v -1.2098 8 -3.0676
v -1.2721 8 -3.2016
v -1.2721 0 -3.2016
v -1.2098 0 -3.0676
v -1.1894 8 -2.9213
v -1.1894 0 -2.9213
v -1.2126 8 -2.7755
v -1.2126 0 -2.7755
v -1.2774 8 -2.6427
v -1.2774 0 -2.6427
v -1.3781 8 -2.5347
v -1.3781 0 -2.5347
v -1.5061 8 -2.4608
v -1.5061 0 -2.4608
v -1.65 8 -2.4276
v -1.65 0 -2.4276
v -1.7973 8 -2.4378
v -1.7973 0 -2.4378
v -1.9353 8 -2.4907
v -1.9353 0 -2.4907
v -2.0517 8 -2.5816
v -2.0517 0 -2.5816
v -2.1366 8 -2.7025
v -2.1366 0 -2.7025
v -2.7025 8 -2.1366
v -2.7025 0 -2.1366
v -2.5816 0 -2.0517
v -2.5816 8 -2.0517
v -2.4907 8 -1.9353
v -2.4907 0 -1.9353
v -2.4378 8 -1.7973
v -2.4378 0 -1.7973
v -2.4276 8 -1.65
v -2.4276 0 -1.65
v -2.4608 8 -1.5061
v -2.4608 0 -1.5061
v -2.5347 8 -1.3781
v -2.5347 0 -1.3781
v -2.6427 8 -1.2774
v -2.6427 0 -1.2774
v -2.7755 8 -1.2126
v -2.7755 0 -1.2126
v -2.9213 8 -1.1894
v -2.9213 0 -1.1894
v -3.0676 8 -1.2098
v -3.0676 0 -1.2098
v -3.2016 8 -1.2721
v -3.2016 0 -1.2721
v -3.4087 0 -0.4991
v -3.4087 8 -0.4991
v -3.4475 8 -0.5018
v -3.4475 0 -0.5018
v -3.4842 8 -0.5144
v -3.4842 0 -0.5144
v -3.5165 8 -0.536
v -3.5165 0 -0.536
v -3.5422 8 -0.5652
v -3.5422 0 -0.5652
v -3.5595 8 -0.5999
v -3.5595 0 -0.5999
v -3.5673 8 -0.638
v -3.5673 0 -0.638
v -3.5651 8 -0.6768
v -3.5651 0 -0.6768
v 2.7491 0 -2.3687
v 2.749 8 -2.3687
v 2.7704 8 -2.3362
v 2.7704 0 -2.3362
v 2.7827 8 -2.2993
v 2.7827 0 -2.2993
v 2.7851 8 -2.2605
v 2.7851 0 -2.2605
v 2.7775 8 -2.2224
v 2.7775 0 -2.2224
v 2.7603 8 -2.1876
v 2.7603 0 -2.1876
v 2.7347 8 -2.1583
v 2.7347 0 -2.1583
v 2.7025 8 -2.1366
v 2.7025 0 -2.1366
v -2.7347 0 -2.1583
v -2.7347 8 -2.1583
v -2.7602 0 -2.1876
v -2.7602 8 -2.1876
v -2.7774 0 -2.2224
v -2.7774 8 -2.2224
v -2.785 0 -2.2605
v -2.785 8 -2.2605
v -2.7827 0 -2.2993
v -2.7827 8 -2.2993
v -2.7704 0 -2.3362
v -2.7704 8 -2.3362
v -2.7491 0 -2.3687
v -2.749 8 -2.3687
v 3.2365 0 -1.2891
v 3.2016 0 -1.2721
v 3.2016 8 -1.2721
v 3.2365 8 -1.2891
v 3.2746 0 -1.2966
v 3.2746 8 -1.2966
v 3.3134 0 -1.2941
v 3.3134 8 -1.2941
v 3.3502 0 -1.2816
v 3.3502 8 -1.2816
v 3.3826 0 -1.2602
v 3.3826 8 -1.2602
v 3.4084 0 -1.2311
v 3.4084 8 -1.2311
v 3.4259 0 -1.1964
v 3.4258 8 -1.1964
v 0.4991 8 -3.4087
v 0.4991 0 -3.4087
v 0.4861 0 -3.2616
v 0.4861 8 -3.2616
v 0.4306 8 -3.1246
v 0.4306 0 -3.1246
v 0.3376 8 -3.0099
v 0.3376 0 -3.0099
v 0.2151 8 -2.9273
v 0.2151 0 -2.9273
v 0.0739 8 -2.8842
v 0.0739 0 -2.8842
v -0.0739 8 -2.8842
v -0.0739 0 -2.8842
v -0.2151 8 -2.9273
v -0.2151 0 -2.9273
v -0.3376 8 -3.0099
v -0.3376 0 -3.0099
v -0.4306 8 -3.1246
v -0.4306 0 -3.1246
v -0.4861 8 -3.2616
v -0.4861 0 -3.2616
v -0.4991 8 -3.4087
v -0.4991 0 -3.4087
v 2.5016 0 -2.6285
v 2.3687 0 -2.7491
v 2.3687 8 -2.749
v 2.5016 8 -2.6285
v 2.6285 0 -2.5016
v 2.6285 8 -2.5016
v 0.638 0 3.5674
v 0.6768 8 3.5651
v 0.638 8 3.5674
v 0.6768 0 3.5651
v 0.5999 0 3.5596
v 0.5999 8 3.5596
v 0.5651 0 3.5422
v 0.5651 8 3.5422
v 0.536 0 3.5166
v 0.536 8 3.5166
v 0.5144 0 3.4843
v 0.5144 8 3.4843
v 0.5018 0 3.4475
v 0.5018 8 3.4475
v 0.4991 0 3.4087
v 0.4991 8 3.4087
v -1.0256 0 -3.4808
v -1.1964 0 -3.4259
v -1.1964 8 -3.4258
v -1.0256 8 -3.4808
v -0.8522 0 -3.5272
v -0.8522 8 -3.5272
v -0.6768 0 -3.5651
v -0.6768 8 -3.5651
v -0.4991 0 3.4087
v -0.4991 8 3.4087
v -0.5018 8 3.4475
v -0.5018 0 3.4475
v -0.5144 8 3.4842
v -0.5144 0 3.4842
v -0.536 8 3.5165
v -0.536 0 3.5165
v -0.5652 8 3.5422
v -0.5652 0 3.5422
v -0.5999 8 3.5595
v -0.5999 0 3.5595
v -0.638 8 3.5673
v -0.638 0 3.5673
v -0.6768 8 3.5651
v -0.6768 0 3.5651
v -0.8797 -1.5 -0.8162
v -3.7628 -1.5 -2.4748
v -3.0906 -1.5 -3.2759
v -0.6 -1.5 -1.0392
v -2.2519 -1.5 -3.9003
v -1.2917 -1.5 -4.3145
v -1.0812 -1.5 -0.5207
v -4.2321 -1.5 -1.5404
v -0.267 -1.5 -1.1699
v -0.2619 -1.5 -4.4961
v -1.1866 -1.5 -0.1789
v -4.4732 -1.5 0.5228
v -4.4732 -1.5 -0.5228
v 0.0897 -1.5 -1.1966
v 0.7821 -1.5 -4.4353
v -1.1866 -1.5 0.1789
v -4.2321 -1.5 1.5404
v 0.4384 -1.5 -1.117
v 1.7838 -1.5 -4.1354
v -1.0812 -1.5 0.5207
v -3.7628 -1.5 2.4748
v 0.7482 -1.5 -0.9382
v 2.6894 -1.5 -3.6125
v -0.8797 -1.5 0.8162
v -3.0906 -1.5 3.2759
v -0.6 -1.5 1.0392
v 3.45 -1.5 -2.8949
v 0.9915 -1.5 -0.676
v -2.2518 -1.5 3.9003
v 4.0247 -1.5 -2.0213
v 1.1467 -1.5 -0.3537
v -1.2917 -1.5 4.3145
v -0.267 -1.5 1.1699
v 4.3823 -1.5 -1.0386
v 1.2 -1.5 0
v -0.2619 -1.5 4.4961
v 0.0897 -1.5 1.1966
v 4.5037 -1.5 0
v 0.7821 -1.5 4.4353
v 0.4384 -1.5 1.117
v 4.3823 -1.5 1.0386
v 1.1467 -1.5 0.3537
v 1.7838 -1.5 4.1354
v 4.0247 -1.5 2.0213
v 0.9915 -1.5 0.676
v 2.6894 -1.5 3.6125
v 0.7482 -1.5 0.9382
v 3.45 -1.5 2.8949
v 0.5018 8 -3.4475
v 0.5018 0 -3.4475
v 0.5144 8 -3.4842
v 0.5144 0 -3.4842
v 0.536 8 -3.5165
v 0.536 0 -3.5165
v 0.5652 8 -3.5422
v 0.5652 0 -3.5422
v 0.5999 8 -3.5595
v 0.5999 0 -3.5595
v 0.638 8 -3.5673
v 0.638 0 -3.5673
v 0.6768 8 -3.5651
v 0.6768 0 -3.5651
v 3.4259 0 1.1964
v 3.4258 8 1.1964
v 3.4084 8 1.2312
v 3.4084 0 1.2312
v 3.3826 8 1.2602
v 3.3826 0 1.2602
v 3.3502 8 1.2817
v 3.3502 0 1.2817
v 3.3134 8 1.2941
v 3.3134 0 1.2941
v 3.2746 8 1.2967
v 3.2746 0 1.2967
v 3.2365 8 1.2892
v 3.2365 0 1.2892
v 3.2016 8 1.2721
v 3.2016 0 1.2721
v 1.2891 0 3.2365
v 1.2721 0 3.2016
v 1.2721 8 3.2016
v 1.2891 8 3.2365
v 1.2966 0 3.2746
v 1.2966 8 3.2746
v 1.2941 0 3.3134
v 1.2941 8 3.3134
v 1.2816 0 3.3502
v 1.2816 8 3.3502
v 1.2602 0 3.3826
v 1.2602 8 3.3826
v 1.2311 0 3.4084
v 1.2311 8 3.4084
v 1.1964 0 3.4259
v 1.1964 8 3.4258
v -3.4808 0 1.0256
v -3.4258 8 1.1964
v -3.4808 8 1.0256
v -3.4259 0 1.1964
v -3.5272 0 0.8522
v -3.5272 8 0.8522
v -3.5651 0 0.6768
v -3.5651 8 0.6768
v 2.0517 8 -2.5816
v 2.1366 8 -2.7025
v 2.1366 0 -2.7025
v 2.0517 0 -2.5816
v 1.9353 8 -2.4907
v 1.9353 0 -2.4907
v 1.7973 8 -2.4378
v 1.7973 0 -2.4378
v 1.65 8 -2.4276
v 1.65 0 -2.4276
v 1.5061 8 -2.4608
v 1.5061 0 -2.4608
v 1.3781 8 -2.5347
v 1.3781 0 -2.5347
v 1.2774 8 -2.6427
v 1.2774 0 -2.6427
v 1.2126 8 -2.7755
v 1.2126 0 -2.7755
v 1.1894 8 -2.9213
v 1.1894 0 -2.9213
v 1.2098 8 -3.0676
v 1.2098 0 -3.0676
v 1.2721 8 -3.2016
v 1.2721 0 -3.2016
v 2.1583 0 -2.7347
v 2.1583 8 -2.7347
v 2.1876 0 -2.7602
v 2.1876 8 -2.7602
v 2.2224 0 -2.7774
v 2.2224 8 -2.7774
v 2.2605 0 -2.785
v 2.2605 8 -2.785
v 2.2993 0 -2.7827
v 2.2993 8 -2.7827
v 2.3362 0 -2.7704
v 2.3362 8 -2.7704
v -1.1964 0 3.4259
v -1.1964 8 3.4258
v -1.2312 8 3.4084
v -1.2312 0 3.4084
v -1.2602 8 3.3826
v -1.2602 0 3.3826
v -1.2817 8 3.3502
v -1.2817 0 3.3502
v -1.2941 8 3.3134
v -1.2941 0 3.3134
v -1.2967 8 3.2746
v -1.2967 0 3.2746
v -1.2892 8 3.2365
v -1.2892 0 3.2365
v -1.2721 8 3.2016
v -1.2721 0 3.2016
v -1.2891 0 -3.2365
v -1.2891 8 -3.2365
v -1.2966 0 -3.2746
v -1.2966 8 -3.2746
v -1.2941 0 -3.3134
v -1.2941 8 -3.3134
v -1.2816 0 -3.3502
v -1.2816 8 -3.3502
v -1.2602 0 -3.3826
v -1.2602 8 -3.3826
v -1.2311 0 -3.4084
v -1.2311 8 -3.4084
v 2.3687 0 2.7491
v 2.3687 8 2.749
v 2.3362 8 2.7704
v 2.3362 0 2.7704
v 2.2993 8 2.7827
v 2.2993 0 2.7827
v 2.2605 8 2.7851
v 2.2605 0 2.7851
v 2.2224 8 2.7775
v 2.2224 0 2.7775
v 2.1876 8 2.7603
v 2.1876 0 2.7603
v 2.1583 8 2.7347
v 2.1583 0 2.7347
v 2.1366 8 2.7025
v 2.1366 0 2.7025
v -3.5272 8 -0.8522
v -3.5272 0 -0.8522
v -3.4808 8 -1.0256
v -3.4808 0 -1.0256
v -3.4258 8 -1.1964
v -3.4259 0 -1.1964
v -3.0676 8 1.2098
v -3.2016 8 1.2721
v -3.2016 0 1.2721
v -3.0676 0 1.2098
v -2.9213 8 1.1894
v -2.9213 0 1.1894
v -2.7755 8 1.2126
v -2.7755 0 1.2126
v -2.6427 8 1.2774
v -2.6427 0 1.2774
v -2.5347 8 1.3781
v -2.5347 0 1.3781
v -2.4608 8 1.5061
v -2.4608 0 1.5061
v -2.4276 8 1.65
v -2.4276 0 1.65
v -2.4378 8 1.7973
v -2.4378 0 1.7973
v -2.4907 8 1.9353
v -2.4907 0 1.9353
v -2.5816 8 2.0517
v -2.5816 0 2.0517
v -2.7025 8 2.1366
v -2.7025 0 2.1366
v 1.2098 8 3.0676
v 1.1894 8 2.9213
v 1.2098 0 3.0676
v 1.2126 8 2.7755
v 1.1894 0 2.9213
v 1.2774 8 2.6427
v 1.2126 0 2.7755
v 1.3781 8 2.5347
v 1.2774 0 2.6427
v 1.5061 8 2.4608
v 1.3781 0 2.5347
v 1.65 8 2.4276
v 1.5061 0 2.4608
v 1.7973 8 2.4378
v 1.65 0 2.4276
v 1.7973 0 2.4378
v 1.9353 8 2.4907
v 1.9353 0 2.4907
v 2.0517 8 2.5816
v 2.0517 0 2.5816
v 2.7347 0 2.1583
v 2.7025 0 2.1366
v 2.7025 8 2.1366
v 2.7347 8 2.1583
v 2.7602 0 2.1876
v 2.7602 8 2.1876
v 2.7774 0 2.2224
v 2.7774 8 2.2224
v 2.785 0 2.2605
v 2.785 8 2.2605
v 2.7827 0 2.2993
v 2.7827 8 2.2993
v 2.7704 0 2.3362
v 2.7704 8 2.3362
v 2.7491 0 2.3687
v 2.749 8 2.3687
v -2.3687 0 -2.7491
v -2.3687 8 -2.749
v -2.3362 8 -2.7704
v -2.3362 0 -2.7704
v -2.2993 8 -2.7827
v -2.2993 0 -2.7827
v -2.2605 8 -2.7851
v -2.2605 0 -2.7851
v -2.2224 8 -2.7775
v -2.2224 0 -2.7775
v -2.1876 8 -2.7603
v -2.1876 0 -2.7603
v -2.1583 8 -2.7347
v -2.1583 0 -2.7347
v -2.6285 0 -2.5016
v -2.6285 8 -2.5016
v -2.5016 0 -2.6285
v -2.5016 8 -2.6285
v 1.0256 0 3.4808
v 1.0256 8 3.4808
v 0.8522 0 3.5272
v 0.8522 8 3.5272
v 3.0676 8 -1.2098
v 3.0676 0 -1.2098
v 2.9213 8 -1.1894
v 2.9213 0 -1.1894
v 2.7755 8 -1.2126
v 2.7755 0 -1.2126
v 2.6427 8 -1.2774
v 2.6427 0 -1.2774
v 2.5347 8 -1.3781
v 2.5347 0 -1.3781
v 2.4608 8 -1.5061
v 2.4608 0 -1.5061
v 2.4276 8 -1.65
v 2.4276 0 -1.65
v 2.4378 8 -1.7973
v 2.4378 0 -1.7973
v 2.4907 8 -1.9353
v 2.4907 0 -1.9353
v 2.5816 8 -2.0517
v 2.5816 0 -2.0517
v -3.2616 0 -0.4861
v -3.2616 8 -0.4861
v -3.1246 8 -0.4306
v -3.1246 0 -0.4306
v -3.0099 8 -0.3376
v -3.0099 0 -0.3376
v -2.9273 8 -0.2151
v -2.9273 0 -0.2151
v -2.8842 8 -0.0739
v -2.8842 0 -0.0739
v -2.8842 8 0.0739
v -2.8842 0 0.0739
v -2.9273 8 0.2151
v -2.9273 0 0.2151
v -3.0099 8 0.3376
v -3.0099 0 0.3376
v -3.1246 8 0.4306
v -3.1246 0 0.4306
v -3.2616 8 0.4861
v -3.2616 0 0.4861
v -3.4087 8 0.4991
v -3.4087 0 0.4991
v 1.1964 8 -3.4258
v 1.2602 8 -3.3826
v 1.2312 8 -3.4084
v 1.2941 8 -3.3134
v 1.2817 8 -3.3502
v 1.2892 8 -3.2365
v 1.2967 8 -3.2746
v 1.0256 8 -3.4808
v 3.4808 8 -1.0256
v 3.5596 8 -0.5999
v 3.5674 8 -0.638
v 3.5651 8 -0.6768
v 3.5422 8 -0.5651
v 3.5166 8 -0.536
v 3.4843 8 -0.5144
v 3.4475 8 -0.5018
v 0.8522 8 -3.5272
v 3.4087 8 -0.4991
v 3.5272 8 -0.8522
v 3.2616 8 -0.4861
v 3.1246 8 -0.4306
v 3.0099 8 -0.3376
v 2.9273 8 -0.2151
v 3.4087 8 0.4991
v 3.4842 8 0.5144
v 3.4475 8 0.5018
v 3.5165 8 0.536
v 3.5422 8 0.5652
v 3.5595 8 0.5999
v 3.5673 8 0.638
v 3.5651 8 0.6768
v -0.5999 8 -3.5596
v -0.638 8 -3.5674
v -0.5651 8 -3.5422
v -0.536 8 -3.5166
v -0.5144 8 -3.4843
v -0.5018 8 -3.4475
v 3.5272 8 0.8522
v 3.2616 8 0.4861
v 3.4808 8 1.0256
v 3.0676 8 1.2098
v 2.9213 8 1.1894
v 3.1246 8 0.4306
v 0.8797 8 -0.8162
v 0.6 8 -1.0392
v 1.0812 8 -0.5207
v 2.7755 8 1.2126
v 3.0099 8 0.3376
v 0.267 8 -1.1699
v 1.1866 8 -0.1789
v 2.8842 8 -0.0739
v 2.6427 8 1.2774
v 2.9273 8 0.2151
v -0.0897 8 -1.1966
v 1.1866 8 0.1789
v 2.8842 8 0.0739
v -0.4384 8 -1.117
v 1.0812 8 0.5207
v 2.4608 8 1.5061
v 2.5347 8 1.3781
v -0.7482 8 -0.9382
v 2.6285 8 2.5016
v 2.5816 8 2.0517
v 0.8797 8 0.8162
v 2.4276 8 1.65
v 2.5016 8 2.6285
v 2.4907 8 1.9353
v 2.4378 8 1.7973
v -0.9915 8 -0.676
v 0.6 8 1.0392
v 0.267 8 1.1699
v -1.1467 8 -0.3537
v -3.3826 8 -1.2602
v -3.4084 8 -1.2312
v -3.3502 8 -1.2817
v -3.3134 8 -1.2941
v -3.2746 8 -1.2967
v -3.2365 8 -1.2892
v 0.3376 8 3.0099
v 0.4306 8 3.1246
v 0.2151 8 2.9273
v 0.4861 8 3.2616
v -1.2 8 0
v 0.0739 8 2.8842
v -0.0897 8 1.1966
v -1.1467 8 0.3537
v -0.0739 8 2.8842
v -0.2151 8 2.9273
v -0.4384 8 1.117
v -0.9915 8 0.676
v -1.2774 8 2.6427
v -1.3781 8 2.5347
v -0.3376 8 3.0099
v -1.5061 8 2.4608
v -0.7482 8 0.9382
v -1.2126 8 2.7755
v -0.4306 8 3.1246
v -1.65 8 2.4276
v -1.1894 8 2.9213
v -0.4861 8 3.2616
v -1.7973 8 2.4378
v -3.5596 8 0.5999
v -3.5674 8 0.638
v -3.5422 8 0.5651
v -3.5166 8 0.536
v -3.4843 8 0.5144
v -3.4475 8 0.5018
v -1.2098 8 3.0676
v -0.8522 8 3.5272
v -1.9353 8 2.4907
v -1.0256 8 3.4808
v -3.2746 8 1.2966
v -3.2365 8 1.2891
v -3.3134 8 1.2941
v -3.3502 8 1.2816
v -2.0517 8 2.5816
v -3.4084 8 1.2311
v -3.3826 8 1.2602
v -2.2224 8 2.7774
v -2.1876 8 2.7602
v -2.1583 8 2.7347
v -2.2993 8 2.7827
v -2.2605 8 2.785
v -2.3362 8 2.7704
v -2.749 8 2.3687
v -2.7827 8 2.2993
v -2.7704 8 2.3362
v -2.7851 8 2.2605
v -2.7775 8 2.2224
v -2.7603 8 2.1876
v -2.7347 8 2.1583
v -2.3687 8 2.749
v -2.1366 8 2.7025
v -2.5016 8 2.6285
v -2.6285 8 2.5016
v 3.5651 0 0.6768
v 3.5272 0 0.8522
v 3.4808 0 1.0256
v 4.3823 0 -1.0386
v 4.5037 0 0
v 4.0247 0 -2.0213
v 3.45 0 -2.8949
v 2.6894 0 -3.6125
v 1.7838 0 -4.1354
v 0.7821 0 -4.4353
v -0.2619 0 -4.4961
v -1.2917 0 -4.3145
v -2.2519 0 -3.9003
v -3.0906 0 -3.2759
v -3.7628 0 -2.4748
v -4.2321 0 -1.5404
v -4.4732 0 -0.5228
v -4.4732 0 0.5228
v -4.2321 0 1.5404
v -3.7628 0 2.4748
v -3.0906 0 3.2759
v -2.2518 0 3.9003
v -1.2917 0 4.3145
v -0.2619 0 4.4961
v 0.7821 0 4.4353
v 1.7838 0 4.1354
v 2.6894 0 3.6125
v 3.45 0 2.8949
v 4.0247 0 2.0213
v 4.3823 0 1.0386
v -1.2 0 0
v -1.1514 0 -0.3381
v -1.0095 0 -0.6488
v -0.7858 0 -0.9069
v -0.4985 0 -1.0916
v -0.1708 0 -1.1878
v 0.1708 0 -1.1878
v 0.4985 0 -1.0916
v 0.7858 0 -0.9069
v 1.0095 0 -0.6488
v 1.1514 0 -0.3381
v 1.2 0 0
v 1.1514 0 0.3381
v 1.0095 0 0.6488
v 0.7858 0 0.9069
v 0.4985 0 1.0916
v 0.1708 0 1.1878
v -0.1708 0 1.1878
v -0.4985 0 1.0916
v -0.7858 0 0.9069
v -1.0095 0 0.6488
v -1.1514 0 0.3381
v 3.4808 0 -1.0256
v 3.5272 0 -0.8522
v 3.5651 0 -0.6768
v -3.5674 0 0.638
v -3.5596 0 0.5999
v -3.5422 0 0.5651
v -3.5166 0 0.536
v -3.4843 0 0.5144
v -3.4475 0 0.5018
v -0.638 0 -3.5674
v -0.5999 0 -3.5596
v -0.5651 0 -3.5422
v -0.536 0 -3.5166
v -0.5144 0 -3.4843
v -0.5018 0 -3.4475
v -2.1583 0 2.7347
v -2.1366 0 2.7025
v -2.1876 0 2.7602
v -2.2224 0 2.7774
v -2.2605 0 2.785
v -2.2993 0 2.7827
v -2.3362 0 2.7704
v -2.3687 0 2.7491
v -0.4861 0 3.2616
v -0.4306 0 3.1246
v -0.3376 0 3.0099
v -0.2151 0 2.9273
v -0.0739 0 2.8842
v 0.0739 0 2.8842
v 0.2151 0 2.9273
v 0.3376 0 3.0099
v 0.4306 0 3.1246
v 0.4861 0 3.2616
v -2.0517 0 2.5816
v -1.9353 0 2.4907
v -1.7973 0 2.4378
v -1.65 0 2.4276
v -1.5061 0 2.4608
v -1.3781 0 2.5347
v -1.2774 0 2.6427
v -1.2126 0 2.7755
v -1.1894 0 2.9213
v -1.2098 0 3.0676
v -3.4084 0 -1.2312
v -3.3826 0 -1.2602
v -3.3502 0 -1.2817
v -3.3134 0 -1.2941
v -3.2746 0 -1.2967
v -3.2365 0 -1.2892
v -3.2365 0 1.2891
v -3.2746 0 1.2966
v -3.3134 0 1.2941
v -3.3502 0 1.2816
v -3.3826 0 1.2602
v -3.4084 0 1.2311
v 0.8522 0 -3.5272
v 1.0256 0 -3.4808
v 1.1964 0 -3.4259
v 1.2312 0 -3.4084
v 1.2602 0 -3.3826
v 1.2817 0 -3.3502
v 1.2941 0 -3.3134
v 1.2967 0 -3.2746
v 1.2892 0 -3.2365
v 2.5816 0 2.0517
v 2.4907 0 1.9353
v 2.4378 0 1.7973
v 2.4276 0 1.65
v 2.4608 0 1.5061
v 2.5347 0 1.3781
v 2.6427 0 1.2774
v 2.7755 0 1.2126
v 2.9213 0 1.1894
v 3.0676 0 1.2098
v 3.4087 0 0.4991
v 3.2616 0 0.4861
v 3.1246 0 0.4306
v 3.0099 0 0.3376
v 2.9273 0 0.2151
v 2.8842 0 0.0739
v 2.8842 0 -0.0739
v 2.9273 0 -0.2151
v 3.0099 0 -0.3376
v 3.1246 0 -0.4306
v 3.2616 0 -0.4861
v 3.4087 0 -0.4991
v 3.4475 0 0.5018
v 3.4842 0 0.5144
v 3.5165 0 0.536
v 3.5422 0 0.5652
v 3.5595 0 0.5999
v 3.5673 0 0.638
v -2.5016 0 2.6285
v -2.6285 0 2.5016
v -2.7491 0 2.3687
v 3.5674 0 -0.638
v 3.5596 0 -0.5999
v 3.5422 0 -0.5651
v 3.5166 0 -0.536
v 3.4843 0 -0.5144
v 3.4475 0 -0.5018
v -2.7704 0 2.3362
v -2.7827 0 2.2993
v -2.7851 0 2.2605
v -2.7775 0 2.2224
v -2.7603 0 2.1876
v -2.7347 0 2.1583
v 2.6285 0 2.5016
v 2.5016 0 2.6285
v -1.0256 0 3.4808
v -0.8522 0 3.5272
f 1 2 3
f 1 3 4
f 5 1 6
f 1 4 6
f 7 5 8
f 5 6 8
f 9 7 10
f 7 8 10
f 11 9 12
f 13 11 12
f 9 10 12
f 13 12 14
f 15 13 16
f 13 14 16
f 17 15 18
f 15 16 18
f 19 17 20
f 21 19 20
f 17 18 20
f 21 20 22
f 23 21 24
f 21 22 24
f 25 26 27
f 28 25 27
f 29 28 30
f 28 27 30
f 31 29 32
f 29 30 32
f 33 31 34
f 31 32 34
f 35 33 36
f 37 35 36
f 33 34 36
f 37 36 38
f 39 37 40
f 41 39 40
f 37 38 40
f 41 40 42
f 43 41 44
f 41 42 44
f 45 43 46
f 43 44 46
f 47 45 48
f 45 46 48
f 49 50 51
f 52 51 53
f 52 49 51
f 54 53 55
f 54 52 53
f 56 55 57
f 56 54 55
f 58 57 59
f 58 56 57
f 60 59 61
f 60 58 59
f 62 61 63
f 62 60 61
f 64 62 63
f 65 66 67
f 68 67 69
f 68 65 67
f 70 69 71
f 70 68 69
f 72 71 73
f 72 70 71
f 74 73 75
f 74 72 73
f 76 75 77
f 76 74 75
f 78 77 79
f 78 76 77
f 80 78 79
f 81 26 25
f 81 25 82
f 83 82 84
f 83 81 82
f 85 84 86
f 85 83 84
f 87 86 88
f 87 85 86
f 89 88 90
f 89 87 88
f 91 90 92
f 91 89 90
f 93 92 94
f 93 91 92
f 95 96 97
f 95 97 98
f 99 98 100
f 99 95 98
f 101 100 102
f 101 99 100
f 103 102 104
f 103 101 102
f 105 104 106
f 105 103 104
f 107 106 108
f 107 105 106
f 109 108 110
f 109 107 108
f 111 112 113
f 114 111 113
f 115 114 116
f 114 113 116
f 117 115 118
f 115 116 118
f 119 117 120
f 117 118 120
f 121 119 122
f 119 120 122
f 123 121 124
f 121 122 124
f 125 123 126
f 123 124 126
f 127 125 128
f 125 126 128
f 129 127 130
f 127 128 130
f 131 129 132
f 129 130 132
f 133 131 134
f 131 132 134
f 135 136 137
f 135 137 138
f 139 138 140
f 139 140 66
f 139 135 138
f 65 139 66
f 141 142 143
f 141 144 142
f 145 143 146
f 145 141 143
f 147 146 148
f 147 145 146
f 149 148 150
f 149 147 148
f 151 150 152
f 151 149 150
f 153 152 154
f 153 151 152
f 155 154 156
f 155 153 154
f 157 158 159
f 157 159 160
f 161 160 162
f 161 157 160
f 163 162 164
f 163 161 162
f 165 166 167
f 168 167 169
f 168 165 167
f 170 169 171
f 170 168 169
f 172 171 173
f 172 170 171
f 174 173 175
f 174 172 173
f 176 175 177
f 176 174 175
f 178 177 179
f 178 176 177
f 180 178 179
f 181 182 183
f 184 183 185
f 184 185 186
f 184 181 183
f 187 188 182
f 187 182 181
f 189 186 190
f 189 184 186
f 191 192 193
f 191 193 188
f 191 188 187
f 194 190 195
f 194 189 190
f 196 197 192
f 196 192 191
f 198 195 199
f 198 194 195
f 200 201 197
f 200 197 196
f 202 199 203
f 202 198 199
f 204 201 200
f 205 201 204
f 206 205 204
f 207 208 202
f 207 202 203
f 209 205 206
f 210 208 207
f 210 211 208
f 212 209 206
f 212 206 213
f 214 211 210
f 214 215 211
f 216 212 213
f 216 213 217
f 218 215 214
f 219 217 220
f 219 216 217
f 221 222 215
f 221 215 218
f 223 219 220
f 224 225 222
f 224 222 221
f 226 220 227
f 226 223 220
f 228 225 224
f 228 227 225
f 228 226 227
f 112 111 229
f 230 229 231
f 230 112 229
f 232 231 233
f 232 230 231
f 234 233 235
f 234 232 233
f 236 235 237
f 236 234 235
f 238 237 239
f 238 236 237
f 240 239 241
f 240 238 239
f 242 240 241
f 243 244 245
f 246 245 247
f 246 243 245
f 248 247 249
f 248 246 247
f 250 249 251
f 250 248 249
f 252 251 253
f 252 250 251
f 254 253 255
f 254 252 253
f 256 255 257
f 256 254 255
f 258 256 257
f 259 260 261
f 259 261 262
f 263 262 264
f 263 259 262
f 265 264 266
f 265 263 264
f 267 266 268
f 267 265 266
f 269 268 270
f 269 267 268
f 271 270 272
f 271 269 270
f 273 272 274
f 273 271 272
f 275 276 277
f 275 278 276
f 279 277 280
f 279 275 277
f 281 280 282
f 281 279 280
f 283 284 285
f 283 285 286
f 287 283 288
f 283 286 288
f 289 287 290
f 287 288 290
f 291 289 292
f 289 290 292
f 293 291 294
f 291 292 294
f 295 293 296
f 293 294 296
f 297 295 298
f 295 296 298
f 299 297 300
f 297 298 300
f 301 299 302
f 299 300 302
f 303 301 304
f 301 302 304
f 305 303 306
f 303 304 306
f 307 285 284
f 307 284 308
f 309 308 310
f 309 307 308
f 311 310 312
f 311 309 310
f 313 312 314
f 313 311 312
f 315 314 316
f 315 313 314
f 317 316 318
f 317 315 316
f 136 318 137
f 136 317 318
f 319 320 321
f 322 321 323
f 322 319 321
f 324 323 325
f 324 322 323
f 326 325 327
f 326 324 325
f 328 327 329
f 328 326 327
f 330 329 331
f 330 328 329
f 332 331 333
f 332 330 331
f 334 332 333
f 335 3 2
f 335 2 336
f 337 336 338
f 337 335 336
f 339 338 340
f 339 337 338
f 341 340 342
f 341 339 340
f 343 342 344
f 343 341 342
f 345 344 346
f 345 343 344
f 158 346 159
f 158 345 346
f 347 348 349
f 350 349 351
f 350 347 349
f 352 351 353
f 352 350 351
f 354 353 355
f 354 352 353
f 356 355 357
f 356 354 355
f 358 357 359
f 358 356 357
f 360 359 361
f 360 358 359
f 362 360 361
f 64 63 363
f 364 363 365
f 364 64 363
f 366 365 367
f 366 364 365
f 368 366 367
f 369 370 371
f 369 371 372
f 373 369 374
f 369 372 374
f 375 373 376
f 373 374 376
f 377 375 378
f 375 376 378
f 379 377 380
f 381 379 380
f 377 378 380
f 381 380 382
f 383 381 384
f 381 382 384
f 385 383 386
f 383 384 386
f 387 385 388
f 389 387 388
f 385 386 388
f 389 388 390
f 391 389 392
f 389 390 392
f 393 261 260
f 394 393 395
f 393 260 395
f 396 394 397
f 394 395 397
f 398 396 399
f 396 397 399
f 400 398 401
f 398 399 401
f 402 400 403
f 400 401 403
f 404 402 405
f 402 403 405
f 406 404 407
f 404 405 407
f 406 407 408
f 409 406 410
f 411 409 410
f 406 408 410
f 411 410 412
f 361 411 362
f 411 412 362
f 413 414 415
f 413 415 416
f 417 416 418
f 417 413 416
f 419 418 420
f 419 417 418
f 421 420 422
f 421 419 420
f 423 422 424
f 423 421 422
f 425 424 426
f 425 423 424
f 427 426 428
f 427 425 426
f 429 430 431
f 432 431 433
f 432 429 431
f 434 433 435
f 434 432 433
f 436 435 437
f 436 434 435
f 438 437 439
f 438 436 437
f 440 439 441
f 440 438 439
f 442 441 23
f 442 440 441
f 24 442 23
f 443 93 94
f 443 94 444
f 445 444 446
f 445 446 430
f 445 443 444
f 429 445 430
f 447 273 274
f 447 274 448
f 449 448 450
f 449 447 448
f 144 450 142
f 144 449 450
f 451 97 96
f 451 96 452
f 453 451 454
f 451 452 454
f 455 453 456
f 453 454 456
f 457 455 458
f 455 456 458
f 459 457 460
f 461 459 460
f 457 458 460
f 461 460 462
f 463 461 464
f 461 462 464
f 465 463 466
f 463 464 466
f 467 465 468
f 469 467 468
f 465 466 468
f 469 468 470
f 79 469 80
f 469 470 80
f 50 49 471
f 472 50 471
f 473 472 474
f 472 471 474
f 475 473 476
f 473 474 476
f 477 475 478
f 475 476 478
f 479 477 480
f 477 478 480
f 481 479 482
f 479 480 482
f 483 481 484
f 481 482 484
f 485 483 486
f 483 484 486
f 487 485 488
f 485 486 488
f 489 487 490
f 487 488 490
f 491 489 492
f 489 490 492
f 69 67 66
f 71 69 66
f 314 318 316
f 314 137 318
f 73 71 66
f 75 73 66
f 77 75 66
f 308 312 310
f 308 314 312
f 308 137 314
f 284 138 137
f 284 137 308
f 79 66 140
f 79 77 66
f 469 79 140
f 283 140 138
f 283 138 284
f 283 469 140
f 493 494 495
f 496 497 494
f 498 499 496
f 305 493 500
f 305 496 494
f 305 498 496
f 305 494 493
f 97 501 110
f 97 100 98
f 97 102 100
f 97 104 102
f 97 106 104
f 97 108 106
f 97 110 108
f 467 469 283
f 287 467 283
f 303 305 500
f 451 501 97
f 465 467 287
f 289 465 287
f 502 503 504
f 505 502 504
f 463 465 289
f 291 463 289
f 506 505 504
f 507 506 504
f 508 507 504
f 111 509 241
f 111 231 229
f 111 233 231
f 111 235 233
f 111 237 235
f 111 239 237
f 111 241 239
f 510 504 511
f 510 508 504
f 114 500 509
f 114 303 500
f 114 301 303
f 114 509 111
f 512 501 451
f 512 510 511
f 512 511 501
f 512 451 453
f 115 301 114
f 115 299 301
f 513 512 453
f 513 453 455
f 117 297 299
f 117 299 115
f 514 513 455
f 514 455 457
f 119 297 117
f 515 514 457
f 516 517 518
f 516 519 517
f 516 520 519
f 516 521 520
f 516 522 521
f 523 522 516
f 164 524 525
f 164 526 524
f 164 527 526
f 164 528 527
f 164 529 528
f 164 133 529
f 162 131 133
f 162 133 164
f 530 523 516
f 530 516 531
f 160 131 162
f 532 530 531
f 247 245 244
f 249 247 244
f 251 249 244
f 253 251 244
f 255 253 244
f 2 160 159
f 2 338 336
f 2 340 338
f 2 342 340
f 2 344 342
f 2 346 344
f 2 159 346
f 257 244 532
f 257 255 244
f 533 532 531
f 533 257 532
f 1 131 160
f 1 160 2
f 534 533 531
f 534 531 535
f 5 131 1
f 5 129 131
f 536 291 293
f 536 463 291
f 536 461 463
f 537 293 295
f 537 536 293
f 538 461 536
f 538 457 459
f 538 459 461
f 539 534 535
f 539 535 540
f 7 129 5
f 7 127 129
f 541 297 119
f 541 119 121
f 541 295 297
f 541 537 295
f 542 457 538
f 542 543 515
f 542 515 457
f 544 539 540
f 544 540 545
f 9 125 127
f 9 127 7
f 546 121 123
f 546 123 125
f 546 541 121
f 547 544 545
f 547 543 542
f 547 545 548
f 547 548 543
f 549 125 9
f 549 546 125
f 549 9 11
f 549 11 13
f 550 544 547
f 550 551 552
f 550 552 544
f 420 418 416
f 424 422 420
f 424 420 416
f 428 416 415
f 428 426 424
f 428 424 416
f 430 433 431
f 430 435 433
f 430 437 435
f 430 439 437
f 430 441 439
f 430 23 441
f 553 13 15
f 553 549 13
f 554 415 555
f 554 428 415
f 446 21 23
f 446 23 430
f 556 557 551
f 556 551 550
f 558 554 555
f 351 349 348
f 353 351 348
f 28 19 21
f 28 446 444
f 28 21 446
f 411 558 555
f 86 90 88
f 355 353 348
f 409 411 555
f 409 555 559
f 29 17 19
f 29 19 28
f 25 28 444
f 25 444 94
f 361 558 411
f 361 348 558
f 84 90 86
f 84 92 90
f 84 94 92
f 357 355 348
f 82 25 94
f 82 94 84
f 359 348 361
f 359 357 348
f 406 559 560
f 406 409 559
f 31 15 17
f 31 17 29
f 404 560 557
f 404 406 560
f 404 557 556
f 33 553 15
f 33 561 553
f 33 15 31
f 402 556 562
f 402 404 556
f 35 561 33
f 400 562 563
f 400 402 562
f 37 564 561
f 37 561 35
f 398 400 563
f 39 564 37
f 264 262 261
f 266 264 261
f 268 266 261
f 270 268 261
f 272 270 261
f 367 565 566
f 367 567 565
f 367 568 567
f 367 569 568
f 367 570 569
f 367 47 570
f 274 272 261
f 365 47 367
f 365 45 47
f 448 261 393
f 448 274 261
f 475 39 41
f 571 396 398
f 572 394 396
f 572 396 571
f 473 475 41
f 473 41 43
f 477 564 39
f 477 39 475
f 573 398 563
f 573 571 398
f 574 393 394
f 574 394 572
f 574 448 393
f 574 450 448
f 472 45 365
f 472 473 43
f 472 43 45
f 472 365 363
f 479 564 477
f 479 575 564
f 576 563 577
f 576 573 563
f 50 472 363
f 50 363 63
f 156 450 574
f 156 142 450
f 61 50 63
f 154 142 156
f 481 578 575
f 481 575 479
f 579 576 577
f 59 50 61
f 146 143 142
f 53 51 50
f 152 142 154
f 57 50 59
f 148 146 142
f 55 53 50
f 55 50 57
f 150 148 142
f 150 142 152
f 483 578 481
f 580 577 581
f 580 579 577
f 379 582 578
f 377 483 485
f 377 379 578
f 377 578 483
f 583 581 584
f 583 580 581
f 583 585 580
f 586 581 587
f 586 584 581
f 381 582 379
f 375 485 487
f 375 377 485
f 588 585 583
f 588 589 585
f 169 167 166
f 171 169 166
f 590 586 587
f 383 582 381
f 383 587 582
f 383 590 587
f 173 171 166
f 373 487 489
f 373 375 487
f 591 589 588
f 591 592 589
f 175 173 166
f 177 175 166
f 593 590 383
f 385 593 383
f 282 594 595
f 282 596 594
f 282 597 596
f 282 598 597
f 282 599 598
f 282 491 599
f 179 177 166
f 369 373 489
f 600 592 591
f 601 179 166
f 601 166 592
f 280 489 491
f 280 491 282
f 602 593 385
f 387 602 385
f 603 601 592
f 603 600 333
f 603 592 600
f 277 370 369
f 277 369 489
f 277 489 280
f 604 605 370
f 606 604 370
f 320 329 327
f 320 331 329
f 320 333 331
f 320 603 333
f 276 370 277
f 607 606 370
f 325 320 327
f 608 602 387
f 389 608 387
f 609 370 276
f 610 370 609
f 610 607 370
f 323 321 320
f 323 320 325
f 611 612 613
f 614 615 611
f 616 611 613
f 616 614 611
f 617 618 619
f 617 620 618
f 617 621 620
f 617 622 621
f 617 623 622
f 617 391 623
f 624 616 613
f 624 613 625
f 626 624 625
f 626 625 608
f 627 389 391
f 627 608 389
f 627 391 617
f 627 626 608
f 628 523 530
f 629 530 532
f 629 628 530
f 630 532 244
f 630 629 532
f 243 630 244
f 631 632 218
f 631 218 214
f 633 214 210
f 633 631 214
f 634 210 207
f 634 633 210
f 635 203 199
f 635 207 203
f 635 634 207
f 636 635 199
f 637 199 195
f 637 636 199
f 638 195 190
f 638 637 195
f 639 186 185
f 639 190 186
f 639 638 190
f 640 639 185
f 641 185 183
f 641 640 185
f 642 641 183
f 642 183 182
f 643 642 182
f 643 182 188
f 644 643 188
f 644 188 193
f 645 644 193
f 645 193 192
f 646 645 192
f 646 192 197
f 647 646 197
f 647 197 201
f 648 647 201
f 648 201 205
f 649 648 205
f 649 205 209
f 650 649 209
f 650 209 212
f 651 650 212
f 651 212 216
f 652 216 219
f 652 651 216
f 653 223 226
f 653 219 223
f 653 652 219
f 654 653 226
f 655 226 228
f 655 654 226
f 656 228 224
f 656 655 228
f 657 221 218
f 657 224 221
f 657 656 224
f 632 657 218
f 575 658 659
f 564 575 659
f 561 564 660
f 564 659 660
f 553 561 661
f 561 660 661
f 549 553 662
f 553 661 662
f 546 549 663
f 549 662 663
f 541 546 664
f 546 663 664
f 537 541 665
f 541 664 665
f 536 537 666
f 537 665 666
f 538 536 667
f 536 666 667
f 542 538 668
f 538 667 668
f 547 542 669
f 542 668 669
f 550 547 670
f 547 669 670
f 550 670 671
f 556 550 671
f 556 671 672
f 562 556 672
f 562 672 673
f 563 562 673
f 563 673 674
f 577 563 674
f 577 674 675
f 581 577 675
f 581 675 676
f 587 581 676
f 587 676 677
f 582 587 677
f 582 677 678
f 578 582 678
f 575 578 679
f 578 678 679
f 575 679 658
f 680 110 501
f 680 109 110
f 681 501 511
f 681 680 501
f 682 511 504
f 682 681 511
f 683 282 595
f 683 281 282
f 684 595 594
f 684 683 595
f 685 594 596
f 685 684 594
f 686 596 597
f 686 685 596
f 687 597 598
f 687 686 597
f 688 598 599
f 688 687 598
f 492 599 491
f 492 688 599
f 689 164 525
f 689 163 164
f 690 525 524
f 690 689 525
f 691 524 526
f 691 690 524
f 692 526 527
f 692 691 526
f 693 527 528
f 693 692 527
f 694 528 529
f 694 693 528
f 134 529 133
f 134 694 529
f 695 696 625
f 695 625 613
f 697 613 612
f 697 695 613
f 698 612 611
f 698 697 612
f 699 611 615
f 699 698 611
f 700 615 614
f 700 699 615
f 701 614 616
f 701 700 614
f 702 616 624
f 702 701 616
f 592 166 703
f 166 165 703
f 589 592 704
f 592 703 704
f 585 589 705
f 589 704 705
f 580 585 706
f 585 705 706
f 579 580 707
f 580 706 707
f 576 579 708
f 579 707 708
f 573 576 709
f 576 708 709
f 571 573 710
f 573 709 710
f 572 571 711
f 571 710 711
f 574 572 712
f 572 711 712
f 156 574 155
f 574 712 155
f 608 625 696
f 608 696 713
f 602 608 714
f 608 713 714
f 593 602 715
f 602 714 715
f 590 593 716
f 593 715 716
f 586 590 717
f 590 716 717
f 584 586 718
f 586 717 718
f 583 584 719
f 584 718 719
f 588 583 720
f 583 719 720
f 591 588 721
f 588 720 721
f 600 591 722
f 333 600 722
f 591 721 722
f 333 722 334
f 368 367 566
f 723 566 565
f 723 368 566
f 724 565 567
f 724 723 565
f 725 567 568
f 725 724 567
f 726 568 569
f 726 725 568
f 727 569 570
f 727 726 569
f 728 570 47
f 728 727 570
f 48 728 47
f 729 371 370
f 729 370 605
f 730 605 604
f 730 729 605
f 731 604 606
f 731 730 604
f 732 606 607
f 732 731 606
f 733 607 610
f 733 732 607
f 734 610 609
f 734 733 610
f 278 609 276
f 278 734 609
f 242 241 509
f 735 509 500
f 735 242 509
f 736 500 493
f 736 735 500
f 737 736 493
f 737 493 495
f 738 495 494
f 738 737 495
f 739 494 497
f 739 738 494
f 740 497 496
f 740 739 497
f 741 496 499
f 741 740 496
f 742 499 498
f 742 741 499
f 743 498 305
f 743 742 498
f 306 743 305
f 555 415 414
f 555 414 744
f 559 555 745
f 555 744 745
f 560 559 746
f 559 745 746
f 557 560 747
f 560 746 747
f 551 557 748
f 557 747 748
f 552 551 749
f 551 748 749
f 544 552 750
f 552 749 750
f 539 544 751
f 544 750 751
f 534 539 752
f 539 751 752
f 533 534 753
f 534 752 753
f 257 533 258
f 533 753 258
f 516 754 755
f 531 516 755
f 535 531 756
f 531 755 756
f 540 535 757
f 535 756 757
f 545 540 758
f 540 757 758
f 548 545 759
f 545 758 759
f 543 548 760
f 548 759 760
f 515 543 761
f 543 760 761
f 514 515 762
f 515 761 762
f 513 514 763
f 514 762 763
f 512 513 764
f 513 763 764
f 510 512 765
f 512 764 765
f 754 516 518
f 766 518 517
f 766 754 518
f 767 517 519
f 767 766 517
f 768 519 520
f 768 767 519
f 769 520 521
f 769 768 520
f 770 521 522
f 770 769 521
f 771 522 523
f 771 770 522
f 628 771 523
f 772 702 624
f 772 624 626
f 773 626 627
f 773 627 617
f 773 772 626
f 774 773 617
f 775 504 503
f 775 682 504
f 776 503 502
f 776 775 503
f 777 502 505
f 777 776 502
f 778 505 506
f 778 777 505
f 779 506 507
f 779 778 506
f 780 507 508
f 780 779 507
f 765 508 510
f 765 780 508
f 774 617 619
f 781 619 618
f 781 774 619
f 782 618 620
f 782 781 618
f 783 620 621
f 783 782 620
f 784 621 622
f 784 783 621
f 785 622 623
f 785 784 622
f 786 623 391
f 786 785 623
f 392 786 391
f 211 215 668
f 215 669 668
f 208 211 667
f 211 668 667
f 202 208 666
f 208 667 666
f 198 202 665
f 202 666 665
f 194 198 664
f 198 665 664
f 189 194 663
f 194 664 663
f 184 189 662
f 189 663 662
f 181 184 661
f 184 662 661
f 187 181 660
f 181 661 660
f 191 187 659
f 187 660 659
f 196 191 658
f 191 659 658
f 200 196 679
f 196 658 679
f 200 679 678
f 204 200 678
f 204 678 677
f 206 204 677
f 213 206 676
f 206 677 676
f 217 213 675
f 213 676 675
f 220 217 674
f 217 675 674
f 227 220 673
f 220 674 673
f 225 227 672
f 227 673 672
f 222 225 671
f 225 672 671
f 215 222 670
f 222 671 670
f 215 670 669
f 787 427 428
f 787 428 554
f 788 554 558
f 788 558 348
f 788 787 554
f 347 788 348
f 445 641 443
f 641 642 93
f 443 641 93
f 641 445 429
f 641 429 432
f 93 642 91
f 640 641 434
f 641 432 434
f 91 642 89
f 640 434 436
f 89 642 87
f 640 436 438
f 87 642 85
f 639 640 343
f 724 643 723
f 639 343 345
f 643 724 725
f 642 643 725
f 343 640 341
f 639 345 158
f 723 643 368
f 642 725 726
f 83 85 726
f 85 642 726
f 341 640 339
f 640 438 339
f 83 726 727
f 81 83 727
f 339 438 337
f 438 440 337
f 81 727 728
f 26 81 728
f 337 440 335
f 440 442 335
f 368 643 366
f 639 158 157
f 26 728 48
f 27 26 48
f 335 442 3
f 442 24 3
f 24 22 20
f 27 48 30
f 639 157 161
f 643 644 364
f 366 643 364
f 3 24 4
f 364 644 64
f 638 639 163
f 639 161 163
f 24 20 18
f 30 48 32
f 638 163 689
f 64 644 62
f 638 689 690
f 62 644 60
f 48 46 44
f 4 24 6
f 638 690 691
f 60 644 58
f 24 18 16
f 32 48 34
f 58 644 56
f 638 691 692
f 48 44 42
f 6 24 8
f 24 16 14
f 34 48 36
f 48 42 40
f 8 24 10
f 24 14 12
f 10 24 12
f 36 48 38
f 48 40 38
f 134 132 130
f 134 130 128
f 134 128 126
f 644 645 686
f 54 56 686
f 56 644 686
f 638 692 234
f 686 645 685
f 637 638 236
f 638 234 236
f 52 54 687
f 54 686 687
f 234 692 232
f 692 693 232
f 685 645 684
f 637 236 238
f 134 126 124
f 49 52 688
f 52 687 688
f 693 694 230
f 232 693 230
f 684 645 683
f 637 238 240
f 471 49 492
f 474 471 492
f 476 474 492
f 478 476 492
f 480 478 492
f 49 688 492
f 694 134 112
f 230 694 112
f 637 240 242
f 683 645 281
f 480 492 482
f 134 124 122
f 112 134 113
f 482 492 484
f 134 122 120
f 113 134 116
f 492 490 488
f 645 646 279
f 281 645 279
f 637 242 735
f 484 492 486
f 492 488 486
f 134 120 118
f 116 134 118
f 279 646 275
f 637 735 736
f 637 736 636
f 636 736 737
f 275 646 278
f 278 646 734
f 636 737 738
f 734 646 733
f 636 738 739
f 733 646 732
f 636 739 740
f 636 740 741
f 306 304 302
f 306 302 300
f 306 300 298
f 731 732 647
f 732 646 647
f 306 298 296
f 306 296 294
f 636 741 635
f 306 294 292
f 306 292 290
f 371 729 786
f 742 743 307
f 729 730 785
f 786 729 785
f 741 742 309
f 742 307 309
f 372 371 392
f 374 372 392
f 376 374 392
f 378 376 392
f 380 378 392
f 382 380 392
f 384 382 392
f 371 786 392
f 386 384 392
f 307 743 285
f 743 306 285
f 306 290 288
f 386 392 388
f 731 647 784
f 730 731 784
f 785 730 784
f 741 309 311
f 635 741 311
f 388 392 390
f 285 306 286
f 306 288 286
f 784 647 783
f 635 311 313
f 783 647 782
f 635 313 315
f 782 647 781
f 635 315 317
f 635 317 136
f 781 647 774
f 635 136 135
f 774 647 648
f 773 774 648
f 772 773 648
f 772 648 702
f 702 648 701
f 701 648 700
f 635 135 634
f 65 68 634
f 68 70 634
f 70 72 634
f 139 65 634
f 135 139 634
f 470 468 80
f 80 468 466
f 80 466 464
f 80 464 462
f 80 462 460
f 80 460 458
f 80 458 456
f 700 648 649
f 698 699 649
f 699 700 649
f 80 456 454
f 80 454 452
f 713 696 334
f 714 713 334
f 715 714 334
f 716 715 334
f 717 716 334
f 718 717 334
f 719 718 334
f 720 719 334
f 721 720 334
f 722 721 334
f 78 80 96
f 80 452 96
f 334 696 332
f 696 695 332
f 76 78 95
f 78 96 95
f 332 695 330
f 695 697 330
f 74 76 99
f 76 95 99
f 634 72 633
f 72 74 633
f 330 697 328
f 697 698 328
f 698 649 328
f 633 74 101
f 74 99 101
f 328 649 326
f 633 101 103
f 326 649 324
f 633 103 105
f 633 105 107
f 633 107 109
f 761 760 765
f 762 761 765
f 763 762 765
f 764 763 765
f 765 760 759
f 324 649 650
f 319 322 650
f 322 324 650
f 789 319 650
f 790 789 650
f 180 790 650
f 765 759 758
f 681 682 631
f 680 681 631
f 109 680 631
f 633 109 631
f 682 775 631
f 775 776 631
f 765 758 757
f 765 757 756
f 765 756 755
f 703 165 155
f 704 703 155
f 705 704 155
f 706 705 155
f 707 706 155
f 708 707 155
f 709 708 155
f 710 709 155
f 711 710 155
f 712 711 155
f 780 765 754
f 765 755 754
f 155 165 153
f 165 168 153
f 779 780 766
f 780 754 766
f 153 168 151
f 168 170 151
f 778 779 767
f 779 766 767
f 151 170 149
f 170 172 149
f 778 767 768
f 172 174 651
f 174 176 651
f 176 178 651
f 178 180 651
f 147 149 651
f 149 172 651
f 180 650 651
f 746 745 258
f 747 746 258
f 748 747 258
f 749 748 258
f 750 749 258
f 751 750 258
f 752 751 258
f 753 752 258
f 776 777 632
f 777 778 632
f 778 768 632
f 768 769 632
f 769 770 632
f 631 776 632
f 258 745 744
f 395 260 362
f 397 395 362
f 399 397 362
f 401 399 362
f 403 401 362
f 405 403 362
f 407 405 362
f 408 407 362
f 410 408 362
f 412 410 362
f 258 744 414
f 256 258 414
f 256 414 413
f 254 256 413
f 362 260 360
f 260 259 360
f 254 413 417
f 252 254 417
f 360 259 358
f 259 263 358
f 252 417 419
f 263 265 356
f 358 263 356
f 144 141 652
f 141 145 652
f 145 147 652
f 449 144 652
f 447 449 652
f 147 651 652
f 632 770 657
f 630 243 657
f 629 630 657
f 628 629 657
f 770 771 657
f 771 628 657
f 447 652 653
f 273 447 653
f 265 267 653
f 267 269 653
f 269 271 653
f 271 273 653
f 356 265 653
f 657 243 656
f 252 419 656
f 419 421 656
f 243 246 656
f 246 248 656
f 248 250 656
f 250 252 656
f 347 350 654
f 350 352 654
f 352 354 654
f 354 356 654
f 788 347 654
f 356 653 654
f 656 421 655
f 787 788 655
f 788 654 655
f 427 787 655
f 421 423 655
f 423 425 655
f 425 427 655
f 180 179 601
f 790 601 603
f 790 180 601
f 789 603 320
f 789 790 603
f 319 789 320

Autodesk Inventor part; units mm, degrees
ref_plane "YZ Plane" through (0, 0, 0) normal (1, 0, 0) x (0, 1, 0)
ref_plane "XZ Plane" through (0, 0, 0) normal (0, 1, 0) x (-1, 0, 0)
ref_plane "XY Plane" through (0, 0, 0) normal (0, 0, 1) x (1, 0, 0)
sketch "Sketch1" plane through (0, 0, 0) normal (0, 1, 0) x (-1, 0, 0)
  circle A0 centre (0, 0) radius 1.2
  circle A1 centre (0, 0) radius 3.6287
  dimension "BoreD" = 2.4
  dimension "OuterD" = 7.2575
extrude "Extrusion1" add sketch "Sketch1" along normal blind 8
sketch "Sketch2" plane through (0, 0, 0) normal (0, -1, 0) x (1, 0, 0)
  circle A0 centre (0, 0) radius 3.6287 projected
  arc A1 (0.4991, -3.4087) -> (0.6768, -3.5651) centre (0.6488, -3.4177) ccw
  arc A2 (0.4991, -3.4087) -> (-0.4991, -3.4087) centre (0, -3.3787) ccw
  arc A3 (-0.6768, -3.5651) -> (-0.4991, -3.4087) centre (-0.6488, -3.4177) ccw
  point P0 (0, -3.6287)
  dimension "d9" = 0.5
  dimension "d10" = 0.15
  dimension "Depth" = 0.25
extrude "Extrusion2" cut sketch "Sketch2" against normal up to next contours A3 A2 A1 A0 picked at (0, -3.374)
pattern_circular "Circular Pattern1" count 12 over 360 about axis through (0, -10, 0) along (0, 1, 0) of "Extrusion2"
sketch "Sketch3" plane through (0, 0, 0) normal (0, -1, 0) x (1, 0, 0)
  circle A0 centre (0, 0) radius 4.5037
  circle A1 centre (0, 0) radius 1.2
  dimension "FaceD" = 9.0075
  dimension "d18" = 2.4
extrude "Extrusion3" add sketch "Sketch3" along normal blind 1.5
equation "\"OuterD\" = 0.604789 * Teeth"
equation "\"Depth\" = Pitch"
equation "\"d18\" = BoreD"
equation "\"BeltWidth\" = 7"
equation "\"Pitch\" = 0.25"
equation "\"Teeth\" = 12"
properties part number "GT2 Gear Pinion"
